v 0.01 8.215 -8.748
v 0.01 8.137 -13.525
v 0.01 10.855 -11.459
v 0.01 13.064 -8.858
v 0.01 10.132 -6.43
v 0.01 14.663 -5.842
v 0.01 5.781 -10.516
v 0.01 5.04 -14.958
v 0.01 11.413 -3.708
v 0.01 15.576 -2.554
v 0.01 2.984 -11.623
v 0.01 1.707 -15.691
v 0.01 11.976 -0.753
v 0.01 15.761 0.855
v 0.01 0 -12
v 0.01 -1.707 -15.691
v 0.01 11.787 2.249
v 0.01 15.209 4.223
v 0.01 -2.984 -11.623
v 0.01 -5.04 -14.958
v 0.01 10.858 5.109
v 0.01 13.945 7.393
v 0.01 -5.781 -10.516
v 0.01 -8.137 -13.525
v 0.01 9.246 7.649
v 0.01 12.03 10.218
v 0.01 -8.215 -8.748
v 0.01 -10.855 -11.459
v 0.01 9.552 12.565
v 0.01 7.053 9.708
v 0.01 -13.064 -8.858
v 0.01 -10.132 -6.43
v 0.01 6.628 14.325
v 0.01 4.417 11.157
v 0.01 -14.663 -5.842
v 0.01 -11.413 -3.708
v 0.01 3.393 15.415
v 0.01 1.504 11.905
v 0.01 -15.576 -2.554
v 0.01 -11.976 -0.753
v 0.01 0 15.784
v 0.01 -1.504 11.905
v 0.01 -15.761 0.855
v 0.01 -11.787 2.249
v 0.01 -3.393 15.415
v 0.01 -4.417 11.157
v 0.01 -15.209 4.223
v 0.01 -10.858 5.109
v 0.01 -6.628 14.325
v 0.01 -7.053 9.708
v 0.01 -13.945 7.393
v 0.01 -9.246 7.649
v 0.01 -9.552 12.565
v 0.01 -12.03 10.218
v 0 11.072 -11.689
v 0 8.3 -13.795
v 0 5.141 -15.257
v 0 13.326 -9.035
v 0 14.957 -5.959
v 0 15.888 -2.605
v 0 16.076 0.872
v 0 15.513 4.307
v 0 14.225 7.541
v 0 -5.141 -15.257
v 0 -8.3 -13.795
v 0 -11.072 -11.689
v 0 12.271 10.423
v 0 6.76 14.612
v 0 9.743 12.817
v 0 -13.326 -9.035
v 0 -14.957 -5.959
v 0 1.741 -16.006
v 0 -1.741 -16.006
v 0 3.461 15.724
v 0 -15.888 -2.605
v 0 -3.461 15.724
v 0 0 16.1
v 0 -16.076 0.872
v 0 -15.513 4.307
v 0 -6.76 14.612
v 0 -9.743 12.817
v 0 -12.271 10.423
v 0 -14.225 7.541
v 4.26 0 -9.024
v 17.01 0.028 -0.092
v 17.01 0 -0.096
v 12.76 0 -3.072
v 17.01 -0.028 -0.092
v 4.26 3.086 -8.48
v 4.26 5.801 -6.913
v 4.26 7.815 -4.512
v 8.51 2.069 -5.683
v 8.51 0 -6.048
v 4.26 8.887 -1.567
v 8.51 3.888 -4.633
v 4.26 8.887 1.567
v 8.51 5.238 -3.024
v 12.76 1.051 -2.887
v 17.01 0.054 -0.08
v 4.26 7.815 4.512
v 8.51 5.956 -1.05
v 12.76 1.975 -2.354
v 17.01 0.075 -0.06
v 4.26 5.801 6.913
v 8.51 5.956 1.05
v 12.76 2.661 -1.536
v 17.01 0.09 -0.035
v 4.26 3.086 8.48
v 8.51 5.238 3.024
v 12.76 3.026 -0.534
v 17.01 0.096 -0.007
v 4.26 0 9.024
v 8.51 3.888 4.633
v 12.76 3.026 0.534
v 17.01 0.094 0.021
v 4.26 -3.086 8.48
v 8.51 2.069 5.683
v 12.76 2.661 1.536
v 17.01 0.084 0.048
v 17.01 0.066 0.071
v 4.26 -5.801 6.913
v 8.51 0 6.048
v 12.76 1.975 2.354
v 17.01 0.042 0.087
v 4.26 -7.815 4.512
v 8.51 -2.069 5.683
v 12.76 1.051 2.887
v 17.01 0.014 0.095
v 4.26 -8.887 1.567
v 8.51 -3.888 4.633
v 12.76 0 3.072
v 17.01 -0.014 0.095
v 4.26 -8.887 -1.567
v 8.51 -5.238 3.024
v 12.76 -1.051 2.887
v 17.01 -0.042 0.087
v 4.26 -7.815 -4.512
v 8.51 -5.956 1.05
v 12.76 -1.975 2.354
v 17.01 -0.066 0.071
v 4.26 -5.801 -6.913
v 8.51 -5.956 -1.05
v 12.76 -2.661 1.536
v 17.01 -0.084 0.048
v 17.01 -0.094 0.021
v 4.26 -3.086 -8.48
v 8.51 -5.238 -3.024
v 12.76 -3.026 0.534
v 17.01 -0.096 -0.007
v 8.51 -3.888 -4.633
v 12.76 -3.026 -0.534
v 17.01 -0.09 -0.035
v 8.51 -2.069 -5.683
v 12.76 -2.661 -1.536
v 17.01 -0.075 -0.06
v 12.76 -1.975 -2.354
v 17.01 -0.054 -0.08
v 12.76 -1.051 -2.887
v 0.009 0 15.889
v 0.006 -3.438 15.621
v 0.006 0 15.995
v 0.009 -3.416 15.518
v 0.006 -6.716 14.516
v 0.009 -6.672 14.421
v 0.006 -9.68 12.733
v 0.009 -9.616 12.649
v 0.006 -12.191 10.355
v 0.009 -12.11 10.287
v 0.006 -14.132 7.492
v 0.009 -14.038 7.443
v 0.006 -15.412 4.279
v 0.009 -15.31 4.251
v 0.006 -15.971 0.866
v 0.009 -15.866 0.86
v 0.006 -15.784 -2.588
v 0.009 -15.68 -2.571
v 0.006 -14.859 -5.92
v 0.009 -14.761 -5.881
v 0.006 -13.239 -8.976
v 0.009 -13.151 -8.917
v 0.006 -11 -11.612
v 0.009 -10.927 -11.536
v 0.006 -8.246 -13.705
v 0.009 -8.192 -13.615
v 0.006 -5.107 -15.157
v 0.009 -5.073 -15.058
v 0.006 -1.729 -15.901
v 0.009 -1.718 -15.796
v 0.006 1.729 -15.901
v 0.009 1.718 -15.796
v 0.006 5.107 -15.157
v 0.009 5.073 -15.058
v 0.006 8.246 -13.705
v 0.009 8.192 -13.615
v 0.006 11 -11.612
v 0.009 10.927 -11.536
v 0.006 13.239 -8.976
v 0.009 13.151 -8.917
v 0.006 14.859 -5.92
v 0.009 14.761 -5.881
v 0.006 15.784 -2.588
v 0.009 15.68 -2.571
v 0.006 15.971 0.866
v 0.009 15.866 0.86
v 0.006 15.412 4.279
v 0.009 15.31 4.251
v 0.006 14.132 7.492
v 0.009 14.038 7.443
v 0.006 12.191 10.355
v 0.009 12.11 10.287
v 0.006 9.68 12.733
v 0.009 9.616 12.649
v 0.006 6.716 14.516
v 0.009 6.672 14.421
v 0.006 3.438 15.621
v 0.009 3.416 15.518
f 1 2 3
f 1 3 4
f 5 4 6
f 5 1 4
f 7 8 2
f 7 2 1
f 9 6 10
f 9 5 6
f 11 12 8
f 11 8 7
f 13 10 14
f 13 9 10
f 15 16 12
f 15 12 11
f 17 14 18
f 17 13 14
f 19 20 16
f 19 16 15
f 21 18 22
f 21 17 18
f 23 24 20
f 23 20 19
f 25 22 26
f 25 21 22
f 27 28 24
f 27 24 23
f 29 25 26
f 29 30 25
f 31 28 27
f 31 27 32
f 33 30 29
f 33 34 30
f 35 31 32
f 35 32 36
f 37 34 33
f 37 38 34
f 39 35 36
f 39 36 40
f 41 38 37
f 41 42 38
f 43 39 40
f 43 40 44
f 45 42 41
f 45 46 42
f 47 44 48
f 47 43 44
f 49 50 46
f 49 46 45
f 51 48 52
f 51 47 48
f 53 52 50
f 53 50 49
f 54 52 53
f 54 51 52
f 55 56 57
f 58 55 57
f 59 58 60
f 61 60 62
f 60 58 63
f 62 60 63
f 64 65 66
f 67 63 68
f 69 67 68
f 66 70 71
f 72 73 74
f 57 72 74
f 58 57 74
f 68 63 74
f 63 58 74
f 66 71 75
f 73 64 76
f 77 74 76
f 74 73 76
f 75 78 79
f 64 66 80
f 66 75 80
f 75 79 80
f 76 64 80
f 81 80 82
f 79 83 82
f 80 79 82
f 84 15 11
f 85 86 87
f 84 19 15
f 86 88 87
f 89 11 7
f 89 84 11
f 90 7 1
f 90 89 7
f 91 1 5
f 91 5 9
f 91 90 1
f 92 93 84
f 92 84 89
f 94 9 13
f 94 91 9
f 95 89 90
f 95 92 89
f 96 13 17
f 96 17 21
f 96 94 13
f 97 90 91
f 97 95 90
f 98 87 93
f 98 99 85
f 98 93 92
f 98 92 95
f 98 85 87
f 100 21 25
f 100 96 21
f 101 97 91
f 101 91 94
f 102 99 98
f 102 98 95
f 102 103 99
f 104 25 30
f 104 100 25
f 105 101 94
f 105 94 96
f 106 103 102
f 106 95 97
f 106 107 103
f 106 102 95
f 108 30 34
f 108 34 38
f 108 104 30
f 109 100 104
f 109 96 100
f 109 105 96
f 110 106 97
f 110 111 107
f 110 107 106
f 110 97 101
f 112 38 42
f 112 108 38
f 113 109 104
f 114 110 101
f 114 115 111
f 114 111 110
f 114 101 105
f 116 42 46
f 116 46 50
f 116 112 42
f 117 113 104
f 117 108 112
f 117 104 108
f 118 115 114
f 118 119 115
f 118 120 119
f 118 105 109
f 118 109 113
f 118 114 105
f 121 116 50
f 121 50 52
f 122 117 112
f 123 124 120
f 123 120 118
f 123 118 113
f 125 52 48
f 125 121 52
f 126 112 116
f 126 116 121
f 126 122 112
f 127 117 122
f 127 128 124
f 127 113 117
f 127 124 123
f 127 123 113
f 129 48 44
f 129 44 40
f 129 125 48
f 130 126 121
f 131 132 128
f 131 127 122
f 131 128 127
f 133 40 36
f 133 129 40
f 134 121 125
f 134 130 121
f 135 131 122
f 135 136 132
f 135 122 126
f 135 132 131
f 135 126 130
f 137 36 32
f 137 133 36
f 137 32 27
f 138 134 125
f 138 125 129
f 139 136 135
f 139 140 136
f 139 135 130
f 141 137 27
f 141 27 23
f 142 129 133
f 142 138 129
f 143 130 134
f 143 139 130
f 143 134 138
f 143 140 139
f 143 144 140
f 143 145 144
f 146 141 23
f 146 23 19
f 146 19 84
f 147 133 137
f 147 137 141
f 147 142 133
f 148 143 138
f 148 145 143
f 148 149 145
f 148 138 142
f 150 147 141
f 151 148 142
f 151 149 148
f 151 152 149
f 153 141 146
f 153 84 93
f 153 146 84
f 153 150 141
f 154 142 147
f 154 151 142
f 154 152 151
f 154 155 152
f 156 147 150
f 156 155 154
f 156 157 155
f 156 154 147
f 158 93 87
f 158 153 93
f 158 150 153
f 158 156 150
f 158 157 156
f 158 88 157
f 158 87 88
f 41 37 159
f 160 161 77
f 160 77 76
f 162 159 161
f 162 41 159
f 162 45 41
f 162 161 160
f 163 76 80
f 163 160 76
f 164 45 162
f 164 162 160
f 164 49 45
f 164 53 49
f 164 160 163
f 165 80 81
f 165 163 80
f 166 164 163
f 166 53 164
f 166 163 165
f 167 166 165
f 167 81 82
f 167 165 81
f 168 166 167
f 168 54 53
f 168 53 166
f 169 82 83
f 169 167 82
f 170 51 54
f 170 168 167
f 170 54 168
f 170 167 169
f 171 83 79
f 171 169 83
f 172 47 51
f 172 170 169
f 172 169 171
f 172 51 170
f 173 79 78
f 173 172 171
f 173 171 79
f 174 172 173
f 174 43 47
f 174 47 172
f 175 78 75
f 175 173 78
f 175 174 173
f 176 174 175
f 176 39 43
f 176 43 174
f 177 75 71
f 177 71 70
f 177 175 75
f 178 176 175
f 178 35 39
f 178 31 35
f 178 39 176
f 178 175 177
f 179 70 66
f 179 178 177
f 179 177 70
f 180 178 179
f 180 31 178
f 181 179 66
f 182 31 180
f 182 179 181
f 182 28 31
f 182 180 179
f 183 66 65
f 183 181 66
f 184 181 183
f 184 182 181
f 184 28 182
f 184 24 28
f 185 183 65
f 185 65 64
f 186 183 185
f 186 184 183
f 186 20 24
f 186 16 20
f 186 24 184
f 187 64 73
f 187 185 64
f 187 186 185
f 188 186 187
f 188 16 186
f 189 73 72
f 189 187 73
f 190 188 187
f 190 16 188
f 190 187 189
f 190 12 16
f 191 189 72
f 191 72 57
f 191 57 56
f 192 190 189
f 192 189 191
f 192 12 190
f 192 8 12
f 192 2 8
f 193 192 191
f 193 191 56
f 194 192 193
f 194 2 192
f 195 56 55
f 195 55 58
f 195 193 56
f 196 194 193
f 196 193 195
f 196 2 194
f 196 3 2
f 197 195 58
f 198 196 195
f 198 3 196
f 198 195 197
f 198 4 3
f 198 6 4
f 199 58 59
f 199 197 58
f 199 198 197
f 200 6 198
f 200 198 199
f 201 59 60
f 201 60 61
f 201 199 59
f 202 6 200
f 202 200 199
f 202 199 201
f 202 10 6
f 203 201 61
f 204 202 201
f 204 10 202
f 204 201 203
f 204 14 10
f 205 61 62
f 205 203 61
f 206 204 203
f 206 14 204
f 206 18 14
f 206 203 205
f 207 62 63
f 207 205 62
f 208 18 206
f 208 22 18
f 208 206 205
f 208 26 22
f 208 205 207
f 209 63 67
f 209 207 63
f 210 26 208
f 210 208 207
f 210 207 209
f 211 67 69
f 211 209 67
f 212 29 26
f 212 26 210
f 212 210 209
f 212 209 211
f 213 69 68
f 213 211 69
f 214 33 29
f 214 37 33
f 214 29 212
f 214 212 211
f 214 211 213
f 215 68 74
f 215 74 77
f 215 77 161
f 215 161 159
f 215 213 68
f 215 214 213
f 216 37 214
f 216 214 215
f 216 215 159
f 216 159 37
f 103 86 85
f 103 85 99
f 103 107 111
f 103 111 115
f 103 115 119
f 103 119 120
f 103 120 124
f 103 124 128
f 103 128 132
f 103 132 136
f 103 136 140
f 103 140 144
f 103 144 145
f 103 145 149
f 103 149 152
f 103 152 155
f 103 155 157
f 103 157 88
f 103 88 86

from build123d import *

# Parameters (mm, degrees)
SKETCH1_R           = 16.1
BOSS_EXTRUDE1_DEPTH = 0.01
FILLET1_R           = 5
SKETCH2_R           = 12
BOSS_EXTRUDE2_DEPTH = 17
CHAMFER1_SIZE       = 17
CHAMFER1_SIZE_2     = 11.90352815


with BuildPart() as part:
    # Sketch1 → Boss-Extrude1 (new body)
    with BuildSketch(Plane(origin=(0, 0, 0), x_dir=(0, 0, -1), z_dir=(1, 0, 0))):
        with Locations(Location((0, 0, 0), (0, 0, 180))):
            Circle(SKETCH1_R)
    extrude(amount=BOSS_EXTRUDE1_DEPTH)

    # Fillet1
    # the kernel refuses this fillet: 5 mm, written as the material it takes off along each edge
    with BuildSketch(Plane(origin=(0.01, 0, 0), x_dir=(0, 0, 1), z_dir=(0, 1, 0))) as fillet1_piece_1:
        with BuildLine():
            CenterArc((15.783930387, -5), FILLET1_R, 86.375692506, 3.624307494)
            Line((15.783930387, 0), (16.1, 0))
            Line((16.1, 0), (16.1, -0.01))
        make_face()
    revolve(axis=Axis((0.01, 0, 0), (1, 0, 0)), mode=Mode.SUBTRACT)

    # Sketch2 → Boss-Extrude2 (add)
    with BuildSketch(Plane(origin=(0.01, 0, 0), x_dir=(0, 0, -1), z_dir=(1, 0, 0))):
        Circle(SKETCH2_R)
    extrude(amount=BOSS_EXTRUDE2_DEPTH)

    # Chamfer1
    # the kernel refuses this chamfer: 17, 11.90352815 mm, written as the material it takes off along each edge
    with BuildSketch(Plane(origin=(17.01, 0, 0), x_dir=(0, 0, -1), z_dir=(0, -1, 0))) as chamfer1_piece_1:
        Polygon((12, -CHAMFER1_SIZE), (12 - CHAMFER1_SIZE_2, 0), (12, 0), align=None)
    revolve(axis=Axis((17.01, 0, 0), (1, 0, 0)), mode=Mode.SUBTRACT)


solid = part.part
